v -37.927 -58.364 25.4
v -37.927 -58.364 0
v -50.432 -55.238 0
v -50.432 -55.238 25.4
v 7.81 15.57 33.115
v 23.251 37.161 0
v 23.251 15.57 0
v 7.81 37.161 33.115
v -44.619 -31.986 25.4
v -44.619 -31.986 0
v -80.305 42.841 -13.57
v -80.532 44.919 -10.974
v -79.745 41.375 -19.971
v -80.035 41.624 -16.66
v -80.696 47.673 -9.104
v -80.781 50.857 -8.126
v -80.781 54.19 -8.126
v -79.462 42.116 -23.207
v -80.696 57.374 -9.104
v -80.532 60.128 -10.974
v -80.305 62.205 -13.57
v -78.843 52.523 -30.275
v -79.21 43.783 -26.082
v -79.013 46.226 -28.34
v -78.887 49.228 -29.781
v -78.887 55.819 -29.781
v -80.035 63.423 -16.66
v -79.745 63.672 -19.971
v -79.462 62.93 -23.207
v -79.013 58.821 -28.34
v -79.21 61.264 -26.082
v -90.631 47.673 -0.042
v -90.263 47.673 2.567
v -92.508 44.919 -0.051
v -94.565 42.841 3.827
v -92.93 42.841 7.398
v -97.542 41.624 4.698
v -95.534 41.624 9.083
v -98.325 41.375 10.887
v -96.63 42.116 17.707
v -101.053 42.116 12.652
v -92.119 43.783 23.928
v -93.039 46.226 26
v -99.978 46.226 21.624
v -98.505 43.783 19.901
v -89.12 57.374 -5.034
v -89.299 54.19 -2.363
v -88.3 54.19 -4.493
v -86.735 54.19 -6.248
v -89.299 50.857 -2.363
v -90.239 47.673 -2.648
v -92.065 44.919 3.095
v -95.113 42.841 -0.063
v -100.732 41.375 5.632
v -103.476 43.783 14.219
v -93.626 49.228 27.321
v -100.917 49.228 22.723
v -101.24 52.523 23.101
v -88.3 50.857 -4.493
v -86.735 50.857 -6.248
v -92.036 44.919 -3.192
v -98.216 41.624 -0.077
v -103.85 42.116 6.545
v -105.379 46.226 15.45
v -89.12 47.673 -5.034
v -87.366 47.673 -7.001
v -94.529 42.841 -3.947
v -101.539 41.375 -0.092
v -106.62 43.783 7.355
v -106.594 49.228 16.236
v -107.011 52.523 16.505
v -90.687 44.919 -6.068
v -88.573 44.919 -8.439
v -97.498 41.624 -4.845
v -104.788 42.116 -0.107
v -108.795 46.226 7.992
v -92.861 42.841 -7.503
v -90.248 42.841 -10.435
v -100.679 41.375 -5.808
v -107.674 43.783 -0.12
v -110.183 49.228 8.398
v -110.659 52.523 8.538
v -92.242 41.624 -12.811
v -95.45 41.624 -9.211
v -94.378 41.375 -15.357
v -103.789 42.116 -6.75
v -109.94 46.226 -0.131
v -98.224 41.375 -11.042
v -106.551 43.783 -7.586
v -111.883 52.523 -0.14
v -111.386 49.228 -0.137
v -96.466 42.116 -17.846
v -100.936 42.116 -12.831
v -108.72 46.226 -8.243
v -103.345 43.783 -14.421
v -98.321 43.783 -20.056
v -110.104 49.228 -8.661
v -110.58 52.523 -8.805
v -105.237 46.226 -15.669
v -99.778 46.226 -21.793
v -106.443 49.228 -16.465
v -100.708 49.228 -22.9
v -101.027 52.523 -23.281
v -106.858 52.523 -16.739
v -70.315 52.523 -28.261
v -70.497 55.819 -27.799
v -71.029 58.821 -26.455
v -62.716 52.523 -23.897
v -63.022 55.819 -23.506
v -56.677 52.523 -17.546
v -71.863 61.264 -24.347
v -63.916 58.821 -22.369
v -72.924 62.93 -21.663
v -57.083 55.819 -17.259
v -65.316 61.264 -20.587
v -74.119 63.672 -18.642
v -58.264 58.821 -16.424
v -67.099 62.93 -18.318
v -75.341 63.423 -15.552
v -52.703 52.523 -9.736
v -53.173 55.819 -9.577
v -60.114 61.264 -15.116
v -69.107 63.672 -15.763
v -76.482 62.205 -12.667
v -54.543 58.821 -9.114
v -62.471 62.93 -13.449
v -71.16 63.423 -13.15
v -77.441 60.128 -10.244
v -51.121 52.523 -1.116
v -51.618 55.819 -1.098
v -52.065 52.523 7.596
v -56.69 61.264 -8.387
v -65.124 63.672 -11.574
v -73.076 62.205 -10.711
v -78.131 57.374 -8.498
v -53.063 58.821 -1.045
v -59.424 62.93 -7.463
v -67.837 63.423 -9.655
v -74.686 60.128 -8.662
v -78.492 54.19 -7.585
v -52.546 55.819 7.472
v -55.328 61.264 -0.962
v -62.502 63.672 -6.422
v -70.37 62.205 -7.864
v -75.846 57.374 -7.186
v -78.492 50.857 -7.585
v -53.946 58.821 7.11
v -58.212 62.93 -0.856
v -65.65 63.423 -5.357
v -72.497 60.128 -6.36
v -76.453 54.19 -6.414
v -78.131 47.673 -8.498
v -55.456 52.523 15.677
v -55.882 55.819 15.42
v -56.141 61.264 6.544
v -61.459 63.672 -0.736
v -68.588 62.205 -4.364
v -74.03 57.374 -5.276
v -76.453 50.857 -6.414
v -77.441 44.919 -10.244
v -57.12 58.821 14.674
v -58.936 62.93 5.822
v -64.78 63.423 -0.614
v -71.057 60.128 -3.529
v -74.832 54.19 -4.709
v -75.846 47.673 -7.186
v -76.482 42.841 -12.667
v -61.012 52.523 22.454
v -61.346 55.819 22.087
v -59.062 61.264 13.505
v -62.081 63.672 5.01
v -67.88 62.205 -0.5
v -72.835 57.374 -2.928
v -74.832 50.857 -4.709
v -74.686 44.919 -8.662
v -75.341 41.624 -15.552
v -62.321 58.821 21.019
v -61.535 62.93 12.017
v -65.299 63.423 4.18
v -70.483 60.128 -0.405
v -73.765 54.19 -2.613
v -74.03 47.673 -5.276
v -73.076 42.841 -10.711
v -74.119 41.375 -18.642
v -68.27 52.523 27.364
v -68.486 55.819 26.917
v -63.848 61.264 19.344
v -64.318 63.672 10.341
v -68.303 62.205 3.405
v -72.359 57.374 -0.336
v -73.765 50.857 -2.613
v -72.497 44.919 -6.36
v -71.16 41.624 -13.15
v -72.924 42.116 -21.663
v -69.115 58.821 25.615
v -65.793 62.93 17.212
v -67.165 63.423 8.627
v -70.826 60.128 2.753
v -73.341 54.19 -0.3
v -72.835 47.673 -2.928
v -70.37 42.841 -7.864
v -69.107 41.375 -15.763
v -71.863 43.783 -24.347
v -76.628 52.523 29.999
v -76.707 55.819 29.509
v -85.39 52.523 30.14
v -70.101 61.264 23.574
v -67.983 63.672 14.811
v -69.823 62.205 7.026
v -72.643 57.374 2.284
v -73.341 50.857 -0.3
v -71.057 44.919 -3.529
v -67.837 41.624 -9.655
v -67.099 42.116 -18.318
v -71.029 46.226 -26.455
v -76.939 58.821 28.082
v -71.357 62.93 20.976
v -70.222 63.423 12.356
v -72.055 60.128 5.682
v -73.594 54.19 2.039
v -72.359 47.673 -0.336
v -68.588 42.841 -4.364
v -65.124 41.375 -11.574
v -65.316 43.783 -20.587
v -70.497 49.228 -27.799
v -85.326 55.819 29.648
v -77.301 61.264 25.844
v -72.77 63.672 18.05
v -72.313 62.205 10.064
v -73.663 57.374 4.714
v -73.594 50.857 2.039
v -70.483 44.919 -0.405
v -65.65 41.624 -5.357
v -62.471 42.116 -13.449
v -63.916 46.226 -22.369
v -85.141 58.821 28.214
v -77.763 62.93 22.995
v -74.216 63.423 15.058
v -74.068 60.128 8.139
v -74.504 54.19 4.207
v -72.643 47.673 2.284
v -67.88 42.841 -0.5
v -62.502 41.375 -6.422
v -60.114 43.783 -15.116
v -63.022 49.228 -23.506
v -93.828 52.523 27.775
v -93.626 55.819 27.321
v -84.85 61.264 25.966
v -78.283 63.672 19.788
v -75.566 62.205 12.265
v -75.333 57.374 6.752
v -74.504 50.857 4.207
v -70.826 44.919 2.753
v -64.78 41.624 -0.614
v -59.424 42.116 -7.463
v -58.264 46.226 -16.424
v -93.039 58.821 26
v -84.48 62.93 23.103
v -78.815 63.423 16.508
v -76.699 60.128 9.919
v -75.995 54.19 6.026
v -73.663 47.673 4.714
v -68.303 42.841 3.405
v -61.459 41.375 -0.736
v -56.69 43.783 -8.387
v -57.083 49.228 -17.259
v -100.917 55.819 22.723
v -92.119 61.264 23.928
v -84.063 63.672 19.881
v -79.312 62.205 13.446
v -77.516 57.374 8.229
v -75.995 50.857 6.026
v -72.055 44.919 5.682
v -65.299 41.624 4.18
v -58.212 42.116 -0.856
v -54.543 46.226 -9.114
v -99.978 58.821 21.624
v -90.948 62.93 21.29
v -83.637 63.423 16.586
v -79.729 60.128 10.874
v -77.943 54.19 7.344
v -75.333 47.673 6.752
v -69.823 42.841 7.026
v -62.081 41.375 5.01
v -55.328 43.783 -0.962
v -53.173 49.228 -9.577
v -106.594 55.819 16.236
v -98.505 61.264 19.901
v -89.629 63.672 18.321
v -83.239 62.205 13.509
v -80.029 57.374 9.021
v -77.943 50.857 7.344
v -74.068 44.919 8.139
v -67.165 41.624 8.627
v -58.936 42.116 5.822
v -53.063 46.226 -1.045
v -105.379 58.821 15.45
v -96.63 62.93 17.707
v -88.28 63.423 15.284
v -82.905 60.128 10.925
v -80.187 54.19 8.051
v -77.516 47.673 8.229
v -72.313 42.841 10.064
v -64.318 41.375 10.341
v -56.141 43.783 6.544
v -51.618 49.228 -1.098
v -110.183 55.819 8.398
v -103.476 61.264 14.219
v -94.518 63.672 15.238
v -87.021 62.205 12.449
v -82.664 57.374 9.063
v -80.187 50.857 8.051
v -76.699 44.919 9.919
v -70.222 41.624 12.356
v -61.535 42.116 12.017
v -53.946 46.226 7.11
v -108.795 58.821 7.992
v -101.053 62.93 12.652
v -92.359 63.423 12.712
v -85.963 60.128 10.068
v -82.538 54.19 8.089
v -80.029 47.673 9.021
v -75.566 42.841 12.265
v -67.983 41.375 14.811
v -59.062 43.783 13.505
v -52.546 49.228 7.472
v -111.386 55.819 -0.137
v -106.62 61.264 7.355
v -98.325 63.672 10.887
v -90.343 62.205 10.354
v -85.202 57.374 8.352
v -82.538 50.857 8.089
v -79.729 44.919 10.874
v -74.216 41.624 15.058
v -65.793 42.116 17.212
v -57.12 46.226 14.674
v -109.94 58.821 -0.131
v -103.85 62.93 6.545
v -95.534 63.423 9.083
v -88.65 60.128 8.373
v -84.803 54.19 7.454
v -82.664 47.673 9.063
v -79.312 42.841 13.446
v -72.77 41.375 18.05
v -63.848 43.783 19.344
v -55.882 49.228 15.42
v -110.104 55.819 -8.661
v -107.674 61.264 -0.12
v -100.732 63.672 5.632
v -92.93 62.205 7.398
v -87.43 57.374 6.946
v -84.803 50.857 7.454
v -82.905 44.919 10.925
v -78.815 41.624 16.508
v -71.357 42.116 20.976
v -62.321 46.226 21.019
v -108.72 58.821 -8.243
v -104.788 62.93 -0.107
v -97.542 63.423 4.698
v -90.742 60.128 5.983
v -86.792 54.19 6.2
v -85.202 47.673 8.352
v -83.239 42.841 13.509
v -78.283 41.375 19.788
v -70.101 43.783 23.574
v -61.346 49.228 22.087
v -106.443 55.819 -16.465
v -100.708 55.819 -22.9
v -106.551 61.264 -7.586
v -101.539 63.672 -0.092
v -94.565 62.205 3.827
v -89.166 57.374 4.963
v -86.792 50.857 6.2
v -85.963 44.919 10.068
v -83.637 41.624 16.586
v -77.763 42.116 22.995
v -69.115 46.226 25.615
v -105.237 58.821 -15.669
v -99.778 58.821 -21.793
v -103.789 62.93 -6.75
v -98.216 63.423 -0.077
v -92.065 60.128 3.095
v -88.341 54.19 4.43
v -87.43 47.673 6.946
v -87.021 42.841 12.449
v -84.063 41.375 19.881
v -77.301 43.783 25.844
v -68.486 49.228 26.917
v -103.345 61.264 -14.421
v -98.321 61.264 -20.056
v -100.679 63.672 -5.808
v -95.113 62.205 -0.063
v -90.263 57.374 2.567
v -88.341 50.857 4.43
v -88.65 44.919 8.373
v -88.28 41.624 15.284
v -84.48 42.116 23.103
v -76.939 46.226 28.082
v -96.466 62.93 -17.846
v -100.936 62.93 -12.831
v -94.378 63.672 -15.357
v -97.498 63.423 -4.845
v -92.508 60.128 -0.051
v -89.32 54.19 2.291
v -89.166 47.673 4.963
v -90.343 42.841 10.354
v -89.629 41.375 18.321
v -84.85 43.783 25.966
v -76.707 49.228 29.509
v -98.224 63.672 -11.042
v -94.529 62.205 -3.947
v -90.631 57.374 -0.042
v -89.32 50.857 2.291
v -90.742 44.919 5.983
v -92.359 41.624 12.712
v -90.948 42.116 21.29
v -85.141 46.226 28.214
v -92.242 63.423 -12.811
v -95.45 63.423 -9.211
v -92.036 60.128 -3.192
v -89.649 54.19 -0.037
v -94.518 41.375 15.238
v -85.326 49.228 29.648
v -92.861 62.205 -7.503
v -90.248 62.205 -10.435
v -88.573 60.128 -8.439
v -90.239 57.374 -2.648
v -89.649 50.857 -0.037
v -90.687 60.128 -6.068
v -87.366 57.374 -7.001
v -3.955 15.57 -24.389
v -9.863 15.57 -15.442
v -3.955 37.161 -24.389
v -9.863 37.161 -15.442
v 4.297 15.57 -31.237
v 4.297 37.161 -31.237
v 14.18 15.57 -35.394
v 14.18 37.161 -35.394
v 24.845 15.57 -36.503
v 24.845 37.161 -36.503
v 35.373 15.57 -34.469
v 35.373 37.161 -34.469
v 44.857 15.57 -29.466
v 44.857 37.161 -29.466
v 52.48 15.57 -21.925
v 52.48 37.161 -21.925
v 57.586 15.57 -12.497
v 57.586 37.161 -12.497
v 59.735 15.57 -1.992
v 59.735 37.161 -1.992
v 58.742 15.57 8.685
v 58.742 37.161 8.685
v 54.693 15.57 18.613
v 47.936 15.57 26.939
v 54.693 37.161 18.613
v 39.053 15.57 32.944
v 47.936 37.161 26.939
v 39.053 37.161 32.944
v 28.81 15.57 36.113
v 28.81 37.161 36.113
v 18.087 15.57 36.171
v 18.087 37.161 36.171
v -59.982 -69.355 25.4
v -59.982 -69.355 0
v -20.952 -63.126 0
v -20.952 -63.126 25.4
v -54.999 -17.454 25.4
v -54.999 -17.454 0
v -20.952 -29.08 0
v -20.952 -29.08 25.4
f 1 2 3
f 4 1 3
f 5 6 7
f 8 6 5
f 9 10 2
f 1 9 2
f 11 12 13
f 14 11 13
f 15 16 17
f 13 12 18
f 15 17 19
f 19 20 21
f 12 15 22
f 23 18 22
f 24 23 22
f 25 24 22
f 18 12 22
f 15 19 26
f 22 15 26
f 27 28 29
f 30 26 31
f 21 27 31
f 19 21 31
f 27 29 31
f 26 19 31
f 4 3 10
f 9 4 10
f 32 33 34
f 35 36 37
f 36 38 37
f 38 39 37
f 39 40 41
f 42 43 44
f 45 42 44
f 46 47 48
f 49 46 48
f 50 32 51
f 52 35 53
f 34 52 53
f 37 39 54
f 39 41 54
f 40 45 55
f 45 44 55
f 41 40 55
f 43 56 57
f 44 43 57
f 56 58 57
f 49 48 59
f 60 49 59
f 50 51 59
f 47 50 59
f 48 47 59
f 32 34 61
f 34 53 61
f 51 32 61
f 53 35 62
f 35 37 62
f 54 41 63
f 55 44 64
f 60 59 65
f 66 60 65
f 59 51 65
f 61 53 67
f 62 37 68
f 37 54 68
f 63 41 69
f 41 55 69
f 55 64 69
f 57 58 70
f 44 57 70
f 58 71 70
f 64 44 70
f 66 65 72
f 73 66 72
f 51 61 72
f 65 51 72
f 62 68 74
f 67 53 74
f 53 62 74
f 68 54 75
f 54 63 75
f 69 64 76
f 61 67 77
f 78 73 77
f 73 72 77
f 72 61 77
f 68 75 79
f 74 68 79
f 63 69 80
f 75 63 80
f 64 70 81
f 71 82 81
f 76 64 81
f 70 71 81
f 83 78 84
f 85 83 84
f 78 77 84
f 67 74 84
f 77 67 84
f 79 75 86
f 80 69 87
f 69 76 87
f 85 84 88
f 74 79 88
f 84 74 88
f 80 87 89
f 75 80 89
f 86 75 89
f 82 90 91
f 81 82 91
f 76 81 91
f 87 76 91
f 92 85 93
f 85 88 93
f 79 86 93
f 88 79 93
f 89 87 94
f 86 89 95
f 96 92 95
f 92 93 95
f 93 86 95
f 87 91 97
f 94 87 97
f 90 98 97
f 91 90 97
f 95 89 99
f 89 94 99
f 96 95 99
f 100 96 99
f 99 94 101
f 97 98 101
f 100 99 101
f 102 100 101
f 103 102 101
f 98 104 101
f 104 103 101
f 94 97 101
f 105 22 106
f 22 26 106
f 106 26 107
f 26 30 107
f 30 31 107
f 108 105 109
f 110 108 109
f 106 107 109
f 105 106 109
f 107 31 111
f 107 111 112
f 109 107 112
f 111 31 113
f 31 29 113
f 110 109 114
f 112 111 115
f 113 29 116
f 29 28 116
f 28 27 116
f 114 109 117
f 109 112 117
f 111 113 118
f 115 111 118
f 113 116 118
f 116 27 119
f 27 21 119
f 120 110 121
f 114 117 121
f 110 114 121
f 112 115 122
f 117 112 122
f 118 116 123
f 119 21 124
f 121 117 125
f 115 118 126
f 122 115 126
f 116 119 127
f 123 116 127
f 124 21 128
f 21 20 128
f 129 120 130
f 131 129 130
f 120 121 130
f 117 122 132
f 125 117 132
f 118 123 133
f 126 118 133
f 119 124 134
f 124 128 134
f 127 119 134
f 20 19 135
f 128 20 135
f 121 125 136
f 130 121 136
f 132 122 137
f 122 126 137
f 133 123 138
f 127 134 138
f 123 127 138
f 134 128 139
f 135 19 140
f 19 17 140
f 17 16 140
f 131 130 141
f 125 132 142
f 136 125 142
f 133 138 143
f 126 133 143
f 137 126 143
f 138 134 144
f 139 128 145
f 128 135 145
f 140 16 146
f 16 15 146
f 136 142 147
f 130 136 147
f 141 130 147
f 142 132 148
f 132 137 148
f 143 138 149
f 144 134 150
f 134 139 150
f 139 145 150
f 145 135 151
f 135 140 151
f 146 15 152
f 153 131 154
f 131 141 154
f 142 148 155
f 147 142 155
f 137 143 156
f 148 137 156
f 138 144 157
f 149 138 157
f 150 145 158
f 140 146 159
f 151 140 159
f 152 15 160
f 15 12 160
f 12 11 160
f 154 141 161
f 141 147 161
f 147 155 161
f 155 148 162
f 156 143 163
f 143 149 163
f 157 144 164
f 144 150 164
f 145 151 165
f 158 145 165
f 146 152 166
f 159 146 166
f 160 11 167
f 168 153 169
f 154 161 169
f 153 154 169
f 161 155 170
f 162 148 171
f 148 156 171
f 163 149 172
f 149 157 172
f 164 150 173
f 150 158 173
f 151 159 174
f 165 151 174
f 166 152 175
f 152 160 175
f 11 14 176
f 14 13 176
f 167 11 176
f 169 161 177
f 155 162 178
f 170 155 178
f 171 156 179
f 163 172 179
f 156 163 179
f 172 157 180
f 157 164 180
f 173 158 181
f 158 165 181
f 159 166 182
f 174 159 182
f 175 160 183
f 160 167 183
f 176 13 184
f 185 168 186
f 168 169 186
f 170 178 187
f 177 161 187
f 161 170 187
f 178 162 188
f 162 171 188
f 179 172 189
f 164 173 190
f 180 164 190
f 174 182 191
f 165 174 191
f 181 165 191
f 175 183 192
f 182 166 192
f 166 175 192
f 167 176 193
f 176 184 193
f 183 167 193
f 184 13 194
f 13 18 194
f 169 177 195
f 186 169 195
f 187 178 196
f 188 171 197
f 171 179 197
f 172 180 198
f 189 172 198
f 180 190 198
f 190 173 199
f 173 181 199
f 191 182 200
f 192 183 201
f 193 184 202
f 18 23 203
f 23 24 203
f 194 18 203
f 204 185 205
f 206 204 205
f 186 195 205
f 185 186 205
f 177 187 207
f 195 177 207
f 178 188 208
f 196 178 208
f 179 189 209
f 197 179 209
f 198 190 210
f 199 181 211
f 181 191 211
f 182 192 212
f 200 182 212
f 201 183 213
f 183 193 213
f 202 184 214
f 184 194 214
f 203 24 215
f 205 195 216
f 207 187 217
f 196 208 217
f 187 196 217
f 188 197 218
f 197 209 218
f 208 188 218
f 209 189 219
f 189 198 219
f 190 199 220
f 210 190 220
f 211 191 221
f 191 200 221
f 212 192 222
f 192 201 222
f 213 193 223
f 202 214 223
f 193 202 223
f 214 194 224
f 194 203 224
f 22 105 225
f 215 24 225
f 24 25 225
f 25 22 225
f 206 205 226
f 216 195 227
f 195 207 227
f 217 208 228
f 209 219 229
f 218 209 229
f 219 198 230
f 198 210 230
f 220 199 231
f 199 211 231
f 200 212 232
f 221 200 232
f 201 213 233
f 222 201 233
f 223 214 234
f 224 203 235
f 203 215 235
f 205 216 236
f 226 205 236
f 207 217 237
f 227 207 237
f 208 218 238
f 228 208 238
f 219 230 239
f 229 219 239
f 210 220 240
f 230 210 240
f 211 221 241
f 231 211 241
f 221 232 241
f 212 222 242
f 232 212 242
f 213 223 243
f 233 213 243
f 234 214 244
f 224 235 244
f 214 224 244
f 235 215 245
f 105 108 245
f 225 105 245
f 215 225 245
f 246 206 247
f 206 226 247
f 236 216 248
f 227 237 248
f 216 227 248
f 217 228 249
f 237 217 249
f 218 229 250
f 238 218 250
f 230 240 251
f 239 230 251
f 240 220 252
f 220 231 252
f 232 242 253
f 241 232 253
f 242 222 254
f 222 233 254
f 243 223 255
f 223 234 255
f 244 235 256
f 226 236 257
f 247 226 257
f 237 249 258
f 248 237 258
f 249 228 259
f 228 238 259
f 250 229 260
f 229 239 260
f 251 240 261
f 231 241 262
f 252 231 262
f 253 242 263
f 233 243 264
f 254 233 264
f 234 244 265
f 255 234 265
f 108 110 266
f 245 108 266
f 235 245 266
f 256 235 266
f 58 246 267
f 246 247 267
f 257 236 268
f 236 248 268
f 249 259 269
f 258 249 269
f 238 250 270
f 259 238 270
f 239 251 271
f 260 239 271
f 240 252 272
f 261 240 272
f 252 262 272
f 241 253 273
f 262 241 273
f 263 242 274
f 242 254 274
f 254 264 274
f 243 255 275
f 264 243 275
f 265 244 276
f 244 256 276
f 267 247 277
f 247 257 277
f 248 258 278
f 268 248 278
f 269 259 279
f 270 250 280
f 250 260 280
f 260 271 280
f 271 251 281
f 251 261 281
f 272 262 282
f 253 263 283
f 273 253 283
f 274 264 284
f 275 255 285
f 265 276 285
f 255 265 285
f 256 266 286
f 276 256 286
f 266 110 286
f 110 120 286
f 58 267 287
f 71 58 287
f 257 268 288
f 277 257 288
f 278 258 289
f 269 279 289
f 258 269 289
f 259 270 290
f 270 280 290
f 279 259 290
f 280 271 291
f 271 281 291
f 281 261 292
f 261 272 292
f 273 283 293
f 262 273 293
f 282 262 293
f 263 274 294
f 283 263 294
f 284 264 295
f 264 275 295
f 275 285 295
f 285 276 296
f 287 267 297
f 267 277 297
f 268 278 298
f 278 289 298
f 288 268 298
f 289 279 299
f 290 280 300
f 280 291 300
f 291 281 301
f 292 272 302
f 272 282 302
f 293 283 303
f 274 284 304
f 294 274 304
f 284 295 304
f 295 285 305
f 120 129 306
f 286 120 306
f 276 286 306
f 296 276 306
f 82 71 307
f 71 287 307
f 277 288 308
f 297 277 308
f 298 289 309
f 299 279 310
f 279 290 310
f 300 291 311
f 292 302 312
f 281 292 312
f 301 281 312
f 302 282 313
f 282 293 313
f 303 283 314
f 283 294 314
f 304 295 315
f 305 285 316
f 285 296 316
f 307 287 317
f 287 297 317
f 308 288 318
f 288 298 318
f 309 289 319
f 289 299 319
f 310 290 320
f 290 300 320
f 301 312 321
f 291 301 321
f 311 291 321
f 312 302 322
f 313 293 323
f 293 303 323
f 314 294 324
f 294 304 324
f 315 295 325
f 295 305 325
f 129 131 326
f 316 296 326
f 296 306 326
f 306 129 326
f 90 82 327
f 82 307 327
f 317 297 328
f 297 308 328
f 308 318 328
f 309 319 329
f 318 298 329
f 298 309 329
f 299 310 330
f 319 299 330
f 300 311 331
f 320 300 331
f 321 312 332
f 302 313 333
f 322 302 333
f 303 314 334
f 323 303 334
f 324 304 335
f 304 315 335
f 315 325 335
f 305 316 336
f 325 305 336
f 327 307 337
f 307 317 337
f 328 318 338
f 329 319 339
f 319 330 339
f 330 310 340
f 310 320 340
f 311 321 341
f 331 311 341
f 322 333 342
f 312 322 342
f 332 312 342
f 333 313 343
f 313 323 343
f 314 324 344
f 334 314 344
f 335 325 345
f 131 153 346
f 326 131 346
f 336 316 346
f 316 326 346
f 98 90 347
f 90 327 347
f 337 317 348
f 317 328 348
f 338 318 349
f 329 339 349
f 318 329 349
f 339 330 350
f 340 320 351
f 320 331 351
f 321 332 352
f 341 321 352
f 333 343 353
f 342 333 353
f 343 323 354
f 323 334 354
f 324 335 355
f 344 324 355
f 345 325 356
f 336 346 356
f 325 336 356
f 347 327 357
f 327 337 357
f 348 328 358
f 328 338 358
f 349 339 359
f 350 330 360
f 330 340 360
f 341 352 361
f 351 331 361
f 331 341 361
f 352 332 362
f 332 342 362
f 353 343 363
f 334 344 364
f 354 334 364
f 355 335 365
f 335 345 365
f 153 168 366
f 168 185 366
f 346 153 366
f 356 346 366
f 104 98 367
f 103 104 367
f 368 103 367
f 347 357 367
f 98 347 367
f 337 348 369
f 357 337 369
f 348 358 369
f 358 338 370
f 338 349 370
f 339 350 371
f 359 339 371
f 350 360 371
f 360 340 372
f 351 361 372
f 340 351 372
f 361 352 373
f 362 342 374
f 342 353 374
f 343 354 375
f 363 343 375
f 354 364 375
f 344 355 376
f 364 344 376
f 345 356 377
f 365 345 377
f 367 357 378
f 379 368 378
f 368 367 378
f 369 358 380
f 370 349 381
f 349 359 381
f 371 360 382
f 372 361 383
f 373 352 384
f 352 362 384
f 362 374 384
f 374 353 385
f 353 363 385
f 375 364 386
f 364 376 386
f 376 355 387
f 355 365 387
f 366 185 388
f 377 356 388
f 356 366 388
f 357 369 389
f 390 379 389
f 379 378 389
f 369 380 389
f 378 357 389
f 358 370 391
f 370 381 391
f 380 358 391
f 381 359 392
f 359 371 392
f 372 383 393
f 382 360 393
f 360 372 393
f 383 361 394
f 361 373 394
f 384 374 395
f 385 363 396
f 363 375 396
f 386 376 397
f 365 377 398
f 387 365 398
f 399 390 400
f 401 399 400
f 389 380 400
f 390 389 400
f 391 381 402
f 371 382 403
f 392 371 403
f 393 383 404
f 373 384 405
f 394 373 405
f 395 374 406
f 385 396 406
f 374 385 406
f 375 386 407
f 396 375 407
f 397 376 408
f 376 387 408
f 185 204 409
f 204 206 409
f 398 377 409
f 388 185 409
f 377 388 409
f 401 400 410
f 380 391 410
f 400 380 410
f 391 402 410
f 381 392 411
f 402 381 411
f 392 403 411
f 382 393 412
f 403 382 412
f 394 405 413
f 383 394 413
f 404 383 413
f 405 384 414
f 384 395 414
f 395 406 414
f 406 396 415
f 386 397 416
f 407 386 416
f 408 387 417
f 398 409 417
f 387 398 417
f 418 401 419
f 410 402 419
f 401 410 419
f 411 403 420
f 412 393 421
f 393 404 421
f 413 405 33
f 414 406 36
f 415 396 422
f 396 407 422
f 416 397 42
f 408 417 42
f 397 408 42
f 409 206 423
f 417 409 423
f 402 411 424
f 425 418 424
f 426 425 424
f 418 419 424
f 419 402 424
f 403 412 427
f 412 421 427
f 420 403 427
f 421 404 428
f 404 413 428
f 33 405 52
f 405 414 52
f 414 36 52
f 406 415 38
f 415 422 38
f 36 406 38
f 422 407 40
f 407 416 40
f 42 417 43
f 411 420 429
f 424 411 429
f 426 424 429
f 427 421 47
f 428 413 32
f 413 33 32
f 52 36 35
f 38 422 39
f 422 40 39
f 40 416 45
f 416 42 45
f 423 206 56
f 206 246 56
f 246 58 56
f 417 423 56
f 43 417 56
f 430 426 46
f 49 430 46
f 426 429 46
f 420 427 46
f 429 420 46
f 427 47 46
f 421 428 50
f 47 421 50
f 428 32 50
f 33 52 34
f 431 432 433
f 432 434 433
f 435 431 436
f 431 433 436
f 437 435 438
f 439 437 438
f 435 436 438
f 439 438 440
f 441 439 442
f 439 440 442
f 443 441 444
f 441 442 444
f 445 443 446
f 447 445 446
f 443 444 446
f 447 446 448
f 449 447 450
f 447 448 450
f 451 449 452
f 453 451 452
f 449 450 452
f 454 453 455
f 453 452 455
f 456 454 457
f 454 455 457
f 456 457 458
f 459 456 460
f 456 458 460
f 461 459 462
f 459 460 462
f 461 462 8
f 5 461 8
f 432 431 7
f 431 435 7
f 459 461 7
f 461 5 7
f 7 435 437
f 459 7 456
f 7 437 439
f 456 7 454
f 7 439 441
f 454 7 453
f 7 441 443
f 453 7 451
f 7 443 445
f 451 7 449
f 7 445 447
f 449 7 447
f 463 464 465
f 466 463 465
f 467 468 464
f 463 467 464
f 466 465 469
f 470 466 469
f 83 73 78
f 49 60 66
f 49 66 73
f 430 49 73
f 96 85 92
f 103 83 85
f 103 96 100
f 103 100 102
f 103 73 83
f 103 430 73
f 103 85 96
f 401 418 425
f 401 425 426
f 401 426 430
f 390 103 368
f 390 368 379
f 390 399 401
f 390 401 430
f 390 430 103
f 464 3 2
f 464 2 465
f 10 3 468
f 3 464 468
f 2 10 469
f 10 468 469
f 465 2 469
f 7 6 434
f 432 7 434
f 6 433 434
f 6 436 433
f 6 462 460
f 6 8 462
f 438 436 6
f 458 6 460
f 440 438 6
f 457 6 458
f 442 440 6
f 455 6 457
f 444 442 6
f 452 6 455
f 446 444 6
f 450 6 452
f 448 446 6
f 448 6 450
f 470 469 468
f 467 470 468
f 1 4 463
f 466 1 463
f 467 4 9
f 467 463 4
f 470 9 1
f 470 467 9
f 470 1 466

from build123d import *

# Parameters (mm, degrees)
F0_R          = 11.1797222355
F1_ANGLE_BACK = 85
F1_ANGLE      = 315
F2_DEPTH      = 25.4
F0_W          = 36.5379918367
F0_H          = 21.5906333178
F3_ANGLE_BACK = 155
F3_ANGLE      = 270


with BuildPart() as f1:
    # F0 (on Top) → F1 (revolve)
    with BuildSketch(Plane.XY, mode=Mode.PRIVATE) as f1_sk:
        with Locations((-62.280677259, 52.5233596563)):
            Circle(F0_R)
    revolve(f1_sk.sketch.rotate(Axis((-81.4920887351, 45.5358419567, 0), (0, -1, 0)), -F1_ANGLE_BACK), axis=Axis((-81.4920887351, 45.5358419567, 0), (0, -1, 0)), revolution_arc=F1_ANGLE)


with BuildPart() as f2:
    # F0 (on Top) → F2 (new body)
    with BuildSketch(Plane.XY):
        Polygon((-20.9524314851, -29.0797241032), (-54.9991987646, -17.4539964646), (-59.9816553295, -69.3545565009), (-20.9524314851, -63.1264895201), align=None)
        Polygon((-50.4319518805, -55.2375987172), (-44.6190871298, -31.9861508906), (-37.9269696142, -58.3638457864), align=None, mode=Mode.SUBTRACT)
    extrude(amount=F2_DEPTH)


with BuildPart() as f3:
    # F0 (on Top) → F3 (revolve)
    with BuildSketch(Plane.XY, mode=Mode.PRIVATE) as f3_sk:
        with Locations((41.5204456076, 26.3654785231)):
            Rectangle(F0_W, F0_H)
    revolve(f3_sk.sketch.rotate(Axis((23.2514496893, 26.3654785231, 0), (0, -1, 0)), -F3_ANGLE_BACK), axis=Axis((23.2514496893, 26.3654785231, 0), (0, -1, 0)), revolution_arc=F3_ANGLE)


solid = Compound([f1.part, f2.part, f3.part])
